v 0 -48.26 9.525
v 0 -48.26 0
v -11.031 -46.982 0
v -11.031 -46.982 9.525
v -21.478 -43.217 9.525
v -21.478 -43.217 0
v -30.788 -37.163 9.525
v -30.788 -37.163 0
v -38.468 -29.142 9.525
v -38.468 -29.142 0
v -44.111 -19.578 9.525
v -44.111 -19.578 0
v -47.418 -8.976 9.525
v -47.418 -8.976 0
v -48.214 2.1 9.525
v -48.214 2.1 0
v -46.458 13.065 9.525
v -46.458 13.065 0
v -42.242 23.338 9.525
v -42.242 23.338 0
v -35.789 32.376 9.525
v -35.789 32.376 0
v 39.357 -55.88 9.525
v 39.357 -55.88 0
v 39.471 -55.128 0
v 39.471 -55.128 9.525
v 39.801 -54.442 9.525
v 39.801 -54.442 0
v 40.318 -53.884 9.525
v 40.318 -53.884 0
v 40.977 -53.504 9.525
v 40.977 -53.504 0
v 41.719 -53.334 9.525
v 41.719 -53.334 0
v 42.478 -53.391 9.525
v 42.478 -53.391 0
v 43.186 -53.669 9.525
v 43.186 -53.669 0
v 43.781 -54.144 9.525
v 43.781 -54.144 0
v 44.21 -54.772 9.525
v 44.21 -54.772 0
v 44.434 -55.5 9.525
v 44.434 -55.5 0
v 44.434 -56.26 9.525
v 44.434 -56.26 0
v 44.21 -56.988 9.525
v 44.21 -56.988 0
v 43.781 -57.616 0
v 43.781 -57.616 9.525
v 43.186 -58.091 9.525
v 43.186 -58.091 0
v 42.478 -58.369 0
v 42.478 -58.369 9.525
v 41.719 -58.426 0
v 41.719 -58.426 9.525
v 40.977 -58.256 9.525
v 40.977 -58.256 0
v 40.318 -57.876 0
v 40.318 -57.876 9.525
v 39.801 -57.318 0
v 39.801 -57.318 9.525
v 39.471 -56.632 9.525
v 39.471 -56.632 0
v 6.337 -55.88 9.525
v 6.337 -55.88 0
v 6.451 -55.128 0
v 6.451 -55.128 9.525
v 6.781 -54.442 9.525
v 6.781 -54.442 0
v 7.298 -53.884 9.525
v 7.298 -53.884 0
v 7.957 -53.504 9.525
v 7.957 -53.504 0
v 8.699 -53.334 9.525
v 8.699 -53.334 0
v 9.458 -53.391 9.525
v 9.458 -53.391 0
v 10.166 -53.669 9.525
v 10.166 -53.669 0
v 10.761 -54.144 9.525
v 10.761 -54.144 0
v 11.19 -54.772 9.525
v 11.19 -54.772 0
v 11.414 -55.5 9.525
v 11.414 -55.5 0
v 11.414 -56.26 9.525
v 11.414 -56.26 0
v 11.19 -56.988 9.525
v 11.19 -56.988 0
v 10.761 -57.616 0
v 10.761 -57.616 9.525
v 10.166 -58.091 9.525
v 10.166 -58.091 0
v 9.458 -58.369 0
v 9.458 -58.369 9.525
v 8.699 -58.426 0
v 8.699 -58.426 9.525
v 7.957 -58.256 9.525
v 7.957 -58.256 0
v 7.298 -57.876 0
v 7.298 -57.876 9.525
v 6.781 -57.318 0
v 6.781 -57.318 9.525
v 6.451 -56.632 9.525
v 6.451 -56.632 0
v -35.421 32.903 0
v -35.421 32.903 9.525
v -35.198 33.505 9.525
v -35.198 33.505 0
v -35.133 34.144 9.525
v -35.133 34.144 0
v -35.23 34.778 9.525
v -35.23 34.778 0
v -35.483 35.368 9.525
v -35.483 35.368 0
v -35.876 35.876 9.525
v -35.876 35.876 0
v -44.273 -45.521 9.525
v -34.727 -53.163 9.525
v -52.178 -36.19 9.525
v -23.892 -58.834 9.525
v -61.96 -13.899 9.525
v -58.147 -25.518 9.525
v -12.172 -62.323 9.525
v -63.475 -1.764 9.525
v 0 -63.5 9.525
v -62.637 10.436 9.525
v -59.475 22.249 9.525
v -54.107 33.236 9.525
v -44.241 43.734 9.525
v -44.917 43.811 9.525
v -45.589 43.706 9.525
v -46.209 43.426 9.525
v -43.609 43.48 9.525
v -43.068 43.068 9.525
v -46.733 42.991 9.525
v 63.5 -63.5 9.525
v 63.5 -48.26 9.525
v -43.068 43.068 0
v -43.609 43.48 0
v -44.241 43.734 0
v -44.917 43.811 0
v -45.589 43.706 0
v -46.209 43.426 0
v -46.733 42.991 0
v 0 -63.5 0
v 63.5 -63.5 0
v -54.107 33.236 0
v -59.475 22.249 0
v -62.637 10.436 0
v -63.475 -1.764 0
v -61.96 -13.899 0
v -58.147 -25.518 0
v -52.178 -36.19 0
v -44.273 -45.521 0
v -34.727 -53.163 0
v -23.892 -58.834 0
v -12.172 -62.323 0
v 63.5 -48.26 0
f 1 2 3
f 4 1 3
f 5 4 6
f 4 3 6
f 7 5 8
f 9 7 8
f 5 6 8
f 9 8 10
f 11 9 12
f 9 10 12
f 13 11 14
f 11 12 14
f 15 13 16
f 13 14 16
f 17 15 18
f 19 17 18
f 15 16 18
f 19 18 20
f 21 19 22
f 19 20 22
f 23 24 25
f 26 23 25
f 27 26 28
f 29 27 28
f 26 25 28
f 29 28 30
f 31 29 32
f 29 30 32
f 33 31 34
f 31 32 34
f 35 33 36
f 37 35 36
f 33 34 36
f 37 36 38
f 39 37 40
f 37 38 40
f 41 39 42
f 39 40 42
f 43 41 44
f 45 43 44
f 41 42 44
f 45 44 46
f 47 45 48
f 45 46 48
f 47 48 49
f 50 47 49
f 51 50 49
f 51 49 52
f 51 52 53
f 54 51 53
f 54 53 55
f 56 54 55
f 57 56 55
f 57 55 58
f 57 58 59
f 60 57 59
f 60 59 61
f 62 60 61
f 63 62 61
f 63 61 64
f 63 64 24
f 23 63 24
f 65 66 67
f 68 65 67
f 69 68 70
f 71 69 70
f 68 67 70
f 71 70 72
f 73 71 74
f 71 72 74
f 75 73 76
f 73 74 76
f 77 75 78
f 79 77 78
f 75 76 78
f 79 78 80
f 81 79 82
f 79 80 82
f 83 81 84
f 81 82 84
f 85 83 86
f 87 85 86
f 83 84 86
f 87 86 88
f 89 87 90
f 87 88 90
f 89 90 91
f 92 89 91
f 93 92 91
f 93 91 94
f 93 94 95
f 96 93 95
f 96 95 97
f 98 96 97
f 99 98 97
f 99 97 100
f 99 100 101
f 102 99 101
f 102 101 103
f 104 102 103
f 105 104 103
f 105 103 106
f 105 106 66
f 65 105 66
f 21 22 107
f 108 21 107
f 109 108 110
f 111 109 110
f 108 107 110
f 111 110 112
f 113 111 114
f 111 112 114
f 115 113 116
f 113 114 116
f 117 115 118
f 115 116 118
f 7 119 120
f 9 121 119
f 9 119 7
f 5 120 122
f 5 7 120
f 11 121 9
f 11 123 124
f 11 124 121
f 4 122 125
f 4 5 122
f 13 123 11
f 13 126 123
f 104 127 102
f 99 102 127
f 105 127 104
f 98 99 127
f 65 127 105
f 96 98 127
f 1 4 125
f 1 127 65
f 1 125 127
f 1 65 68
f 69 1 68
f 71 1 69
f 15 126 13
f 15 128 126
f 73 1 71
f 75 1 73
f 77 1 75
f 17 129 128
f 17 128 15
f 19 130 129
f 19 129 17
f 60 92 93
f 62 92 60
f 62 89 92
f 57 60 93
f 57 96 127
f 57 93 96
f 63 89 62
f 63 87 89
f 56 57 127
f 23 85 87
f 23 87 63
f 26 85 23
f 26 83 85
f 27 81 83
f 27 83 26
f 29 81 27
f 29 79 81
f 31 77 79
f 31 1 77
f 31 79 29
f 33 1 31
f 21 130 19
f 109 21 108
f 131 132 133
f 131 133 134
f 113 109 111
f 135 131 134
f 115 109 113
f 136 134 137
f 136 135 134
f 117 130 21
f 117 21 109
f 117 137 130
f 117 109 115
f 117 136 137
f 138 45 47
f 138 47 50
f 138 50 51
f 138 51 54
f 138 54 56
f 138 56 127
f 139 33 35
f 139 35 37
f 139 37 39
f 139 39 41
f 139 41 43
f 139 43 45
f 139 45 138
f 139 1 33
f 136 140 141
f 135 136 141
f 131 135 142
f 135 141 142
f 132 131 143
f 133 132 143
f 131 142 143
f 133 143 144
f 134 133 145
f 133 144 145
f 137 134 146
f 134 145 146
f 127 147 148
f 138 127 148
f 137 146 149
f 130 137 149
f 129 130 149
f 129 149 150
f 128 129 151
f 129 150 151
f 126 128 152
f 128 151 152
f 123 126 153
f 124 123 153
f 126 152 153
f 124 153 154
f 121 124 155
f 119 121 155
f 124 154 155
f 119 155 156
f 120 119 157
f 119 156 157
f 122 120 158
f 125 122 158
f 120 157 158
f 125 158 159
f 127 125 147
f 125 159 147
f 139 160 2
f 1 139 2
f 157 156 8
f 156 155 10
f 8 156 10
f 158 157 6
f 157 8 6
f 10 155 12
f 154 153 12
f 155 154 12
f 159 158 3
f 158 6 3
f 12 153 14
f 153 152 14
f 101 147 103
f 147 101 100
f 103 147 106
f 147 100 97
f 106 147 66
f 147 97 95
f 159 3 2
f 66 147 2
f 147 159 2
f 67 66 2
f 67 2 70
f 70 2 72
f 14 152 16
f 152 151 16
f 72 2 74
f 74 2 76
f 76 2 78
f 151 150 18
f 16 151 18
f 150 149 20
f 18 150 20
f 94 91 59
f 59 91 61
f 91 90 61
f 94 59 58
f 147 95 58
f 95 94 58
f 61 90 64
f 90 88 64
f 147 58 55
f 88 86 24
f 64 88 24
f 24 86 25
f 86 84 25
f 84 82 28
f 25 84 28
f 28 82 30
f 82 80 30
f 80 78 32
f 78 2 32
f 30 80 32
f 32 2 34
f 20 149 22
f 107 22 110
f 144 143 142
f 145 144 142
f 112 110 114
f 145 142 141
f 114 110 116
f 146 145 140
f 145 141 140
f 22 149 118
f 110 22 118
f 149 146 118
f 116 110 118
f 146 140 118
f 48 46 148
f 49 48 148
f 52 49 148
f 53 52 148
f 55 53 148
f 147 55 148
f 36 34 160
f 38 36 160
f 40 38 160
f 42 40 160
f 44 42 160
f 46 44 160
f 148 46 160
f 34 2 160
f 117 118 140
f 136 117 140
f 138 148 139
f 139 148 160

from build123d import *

# Parameters (mm, degrees)
BOSS_EXTRUDE1_DEPTH     = 9.525
F_1_4_20_TAPPED_HOLE1_D = 5.1054


with BuildPart() as part:
    # Sketch2 → Boss-Extrude1 (new body)
    with BuildSketch(Plane.XY):
        with BuildLine():
            Line((0, -63.5), (63.5, -63.5))
            Line((63.5, -63.5), (63.5, -48.26))
            Line((63.5, -48.26), (0, -48.26))
            ThreePointArc((0, -48.26), (-44.110630078, -19.577535956), (-35.788539013, 32.376041687))
            ThreePointArc((-35.788539013, 32.376041687), (-35.1329407, 34.143563747), (-35.876095105, 35.876095105))
            Line((-35.876095105, 35.876095105), (-43.067795393, 43.067795393))
            ThreePointArc((-43.067795393, 43.067795393), (-44.916774776, 43.811192654), (-46.733173559, 42.991400176))
            ThreePointArc((-46.733173559, 42.991400176), (-58.147243749, -25.517602639), (0, -63.5))
        make_face()
    extrude(amount=BOSS_EXTRUDE1_DEPTH)

    # 1/4-20 Tapped Hole1 (through all)
    with Locations(Plane.XY.offset(9.525)):
        with Locations((8.89, -55.88), (41.91, -55.88)):
            Hole(F_1_4_20_TAPPED_HOLE1_D / 2)


solid = part.part
